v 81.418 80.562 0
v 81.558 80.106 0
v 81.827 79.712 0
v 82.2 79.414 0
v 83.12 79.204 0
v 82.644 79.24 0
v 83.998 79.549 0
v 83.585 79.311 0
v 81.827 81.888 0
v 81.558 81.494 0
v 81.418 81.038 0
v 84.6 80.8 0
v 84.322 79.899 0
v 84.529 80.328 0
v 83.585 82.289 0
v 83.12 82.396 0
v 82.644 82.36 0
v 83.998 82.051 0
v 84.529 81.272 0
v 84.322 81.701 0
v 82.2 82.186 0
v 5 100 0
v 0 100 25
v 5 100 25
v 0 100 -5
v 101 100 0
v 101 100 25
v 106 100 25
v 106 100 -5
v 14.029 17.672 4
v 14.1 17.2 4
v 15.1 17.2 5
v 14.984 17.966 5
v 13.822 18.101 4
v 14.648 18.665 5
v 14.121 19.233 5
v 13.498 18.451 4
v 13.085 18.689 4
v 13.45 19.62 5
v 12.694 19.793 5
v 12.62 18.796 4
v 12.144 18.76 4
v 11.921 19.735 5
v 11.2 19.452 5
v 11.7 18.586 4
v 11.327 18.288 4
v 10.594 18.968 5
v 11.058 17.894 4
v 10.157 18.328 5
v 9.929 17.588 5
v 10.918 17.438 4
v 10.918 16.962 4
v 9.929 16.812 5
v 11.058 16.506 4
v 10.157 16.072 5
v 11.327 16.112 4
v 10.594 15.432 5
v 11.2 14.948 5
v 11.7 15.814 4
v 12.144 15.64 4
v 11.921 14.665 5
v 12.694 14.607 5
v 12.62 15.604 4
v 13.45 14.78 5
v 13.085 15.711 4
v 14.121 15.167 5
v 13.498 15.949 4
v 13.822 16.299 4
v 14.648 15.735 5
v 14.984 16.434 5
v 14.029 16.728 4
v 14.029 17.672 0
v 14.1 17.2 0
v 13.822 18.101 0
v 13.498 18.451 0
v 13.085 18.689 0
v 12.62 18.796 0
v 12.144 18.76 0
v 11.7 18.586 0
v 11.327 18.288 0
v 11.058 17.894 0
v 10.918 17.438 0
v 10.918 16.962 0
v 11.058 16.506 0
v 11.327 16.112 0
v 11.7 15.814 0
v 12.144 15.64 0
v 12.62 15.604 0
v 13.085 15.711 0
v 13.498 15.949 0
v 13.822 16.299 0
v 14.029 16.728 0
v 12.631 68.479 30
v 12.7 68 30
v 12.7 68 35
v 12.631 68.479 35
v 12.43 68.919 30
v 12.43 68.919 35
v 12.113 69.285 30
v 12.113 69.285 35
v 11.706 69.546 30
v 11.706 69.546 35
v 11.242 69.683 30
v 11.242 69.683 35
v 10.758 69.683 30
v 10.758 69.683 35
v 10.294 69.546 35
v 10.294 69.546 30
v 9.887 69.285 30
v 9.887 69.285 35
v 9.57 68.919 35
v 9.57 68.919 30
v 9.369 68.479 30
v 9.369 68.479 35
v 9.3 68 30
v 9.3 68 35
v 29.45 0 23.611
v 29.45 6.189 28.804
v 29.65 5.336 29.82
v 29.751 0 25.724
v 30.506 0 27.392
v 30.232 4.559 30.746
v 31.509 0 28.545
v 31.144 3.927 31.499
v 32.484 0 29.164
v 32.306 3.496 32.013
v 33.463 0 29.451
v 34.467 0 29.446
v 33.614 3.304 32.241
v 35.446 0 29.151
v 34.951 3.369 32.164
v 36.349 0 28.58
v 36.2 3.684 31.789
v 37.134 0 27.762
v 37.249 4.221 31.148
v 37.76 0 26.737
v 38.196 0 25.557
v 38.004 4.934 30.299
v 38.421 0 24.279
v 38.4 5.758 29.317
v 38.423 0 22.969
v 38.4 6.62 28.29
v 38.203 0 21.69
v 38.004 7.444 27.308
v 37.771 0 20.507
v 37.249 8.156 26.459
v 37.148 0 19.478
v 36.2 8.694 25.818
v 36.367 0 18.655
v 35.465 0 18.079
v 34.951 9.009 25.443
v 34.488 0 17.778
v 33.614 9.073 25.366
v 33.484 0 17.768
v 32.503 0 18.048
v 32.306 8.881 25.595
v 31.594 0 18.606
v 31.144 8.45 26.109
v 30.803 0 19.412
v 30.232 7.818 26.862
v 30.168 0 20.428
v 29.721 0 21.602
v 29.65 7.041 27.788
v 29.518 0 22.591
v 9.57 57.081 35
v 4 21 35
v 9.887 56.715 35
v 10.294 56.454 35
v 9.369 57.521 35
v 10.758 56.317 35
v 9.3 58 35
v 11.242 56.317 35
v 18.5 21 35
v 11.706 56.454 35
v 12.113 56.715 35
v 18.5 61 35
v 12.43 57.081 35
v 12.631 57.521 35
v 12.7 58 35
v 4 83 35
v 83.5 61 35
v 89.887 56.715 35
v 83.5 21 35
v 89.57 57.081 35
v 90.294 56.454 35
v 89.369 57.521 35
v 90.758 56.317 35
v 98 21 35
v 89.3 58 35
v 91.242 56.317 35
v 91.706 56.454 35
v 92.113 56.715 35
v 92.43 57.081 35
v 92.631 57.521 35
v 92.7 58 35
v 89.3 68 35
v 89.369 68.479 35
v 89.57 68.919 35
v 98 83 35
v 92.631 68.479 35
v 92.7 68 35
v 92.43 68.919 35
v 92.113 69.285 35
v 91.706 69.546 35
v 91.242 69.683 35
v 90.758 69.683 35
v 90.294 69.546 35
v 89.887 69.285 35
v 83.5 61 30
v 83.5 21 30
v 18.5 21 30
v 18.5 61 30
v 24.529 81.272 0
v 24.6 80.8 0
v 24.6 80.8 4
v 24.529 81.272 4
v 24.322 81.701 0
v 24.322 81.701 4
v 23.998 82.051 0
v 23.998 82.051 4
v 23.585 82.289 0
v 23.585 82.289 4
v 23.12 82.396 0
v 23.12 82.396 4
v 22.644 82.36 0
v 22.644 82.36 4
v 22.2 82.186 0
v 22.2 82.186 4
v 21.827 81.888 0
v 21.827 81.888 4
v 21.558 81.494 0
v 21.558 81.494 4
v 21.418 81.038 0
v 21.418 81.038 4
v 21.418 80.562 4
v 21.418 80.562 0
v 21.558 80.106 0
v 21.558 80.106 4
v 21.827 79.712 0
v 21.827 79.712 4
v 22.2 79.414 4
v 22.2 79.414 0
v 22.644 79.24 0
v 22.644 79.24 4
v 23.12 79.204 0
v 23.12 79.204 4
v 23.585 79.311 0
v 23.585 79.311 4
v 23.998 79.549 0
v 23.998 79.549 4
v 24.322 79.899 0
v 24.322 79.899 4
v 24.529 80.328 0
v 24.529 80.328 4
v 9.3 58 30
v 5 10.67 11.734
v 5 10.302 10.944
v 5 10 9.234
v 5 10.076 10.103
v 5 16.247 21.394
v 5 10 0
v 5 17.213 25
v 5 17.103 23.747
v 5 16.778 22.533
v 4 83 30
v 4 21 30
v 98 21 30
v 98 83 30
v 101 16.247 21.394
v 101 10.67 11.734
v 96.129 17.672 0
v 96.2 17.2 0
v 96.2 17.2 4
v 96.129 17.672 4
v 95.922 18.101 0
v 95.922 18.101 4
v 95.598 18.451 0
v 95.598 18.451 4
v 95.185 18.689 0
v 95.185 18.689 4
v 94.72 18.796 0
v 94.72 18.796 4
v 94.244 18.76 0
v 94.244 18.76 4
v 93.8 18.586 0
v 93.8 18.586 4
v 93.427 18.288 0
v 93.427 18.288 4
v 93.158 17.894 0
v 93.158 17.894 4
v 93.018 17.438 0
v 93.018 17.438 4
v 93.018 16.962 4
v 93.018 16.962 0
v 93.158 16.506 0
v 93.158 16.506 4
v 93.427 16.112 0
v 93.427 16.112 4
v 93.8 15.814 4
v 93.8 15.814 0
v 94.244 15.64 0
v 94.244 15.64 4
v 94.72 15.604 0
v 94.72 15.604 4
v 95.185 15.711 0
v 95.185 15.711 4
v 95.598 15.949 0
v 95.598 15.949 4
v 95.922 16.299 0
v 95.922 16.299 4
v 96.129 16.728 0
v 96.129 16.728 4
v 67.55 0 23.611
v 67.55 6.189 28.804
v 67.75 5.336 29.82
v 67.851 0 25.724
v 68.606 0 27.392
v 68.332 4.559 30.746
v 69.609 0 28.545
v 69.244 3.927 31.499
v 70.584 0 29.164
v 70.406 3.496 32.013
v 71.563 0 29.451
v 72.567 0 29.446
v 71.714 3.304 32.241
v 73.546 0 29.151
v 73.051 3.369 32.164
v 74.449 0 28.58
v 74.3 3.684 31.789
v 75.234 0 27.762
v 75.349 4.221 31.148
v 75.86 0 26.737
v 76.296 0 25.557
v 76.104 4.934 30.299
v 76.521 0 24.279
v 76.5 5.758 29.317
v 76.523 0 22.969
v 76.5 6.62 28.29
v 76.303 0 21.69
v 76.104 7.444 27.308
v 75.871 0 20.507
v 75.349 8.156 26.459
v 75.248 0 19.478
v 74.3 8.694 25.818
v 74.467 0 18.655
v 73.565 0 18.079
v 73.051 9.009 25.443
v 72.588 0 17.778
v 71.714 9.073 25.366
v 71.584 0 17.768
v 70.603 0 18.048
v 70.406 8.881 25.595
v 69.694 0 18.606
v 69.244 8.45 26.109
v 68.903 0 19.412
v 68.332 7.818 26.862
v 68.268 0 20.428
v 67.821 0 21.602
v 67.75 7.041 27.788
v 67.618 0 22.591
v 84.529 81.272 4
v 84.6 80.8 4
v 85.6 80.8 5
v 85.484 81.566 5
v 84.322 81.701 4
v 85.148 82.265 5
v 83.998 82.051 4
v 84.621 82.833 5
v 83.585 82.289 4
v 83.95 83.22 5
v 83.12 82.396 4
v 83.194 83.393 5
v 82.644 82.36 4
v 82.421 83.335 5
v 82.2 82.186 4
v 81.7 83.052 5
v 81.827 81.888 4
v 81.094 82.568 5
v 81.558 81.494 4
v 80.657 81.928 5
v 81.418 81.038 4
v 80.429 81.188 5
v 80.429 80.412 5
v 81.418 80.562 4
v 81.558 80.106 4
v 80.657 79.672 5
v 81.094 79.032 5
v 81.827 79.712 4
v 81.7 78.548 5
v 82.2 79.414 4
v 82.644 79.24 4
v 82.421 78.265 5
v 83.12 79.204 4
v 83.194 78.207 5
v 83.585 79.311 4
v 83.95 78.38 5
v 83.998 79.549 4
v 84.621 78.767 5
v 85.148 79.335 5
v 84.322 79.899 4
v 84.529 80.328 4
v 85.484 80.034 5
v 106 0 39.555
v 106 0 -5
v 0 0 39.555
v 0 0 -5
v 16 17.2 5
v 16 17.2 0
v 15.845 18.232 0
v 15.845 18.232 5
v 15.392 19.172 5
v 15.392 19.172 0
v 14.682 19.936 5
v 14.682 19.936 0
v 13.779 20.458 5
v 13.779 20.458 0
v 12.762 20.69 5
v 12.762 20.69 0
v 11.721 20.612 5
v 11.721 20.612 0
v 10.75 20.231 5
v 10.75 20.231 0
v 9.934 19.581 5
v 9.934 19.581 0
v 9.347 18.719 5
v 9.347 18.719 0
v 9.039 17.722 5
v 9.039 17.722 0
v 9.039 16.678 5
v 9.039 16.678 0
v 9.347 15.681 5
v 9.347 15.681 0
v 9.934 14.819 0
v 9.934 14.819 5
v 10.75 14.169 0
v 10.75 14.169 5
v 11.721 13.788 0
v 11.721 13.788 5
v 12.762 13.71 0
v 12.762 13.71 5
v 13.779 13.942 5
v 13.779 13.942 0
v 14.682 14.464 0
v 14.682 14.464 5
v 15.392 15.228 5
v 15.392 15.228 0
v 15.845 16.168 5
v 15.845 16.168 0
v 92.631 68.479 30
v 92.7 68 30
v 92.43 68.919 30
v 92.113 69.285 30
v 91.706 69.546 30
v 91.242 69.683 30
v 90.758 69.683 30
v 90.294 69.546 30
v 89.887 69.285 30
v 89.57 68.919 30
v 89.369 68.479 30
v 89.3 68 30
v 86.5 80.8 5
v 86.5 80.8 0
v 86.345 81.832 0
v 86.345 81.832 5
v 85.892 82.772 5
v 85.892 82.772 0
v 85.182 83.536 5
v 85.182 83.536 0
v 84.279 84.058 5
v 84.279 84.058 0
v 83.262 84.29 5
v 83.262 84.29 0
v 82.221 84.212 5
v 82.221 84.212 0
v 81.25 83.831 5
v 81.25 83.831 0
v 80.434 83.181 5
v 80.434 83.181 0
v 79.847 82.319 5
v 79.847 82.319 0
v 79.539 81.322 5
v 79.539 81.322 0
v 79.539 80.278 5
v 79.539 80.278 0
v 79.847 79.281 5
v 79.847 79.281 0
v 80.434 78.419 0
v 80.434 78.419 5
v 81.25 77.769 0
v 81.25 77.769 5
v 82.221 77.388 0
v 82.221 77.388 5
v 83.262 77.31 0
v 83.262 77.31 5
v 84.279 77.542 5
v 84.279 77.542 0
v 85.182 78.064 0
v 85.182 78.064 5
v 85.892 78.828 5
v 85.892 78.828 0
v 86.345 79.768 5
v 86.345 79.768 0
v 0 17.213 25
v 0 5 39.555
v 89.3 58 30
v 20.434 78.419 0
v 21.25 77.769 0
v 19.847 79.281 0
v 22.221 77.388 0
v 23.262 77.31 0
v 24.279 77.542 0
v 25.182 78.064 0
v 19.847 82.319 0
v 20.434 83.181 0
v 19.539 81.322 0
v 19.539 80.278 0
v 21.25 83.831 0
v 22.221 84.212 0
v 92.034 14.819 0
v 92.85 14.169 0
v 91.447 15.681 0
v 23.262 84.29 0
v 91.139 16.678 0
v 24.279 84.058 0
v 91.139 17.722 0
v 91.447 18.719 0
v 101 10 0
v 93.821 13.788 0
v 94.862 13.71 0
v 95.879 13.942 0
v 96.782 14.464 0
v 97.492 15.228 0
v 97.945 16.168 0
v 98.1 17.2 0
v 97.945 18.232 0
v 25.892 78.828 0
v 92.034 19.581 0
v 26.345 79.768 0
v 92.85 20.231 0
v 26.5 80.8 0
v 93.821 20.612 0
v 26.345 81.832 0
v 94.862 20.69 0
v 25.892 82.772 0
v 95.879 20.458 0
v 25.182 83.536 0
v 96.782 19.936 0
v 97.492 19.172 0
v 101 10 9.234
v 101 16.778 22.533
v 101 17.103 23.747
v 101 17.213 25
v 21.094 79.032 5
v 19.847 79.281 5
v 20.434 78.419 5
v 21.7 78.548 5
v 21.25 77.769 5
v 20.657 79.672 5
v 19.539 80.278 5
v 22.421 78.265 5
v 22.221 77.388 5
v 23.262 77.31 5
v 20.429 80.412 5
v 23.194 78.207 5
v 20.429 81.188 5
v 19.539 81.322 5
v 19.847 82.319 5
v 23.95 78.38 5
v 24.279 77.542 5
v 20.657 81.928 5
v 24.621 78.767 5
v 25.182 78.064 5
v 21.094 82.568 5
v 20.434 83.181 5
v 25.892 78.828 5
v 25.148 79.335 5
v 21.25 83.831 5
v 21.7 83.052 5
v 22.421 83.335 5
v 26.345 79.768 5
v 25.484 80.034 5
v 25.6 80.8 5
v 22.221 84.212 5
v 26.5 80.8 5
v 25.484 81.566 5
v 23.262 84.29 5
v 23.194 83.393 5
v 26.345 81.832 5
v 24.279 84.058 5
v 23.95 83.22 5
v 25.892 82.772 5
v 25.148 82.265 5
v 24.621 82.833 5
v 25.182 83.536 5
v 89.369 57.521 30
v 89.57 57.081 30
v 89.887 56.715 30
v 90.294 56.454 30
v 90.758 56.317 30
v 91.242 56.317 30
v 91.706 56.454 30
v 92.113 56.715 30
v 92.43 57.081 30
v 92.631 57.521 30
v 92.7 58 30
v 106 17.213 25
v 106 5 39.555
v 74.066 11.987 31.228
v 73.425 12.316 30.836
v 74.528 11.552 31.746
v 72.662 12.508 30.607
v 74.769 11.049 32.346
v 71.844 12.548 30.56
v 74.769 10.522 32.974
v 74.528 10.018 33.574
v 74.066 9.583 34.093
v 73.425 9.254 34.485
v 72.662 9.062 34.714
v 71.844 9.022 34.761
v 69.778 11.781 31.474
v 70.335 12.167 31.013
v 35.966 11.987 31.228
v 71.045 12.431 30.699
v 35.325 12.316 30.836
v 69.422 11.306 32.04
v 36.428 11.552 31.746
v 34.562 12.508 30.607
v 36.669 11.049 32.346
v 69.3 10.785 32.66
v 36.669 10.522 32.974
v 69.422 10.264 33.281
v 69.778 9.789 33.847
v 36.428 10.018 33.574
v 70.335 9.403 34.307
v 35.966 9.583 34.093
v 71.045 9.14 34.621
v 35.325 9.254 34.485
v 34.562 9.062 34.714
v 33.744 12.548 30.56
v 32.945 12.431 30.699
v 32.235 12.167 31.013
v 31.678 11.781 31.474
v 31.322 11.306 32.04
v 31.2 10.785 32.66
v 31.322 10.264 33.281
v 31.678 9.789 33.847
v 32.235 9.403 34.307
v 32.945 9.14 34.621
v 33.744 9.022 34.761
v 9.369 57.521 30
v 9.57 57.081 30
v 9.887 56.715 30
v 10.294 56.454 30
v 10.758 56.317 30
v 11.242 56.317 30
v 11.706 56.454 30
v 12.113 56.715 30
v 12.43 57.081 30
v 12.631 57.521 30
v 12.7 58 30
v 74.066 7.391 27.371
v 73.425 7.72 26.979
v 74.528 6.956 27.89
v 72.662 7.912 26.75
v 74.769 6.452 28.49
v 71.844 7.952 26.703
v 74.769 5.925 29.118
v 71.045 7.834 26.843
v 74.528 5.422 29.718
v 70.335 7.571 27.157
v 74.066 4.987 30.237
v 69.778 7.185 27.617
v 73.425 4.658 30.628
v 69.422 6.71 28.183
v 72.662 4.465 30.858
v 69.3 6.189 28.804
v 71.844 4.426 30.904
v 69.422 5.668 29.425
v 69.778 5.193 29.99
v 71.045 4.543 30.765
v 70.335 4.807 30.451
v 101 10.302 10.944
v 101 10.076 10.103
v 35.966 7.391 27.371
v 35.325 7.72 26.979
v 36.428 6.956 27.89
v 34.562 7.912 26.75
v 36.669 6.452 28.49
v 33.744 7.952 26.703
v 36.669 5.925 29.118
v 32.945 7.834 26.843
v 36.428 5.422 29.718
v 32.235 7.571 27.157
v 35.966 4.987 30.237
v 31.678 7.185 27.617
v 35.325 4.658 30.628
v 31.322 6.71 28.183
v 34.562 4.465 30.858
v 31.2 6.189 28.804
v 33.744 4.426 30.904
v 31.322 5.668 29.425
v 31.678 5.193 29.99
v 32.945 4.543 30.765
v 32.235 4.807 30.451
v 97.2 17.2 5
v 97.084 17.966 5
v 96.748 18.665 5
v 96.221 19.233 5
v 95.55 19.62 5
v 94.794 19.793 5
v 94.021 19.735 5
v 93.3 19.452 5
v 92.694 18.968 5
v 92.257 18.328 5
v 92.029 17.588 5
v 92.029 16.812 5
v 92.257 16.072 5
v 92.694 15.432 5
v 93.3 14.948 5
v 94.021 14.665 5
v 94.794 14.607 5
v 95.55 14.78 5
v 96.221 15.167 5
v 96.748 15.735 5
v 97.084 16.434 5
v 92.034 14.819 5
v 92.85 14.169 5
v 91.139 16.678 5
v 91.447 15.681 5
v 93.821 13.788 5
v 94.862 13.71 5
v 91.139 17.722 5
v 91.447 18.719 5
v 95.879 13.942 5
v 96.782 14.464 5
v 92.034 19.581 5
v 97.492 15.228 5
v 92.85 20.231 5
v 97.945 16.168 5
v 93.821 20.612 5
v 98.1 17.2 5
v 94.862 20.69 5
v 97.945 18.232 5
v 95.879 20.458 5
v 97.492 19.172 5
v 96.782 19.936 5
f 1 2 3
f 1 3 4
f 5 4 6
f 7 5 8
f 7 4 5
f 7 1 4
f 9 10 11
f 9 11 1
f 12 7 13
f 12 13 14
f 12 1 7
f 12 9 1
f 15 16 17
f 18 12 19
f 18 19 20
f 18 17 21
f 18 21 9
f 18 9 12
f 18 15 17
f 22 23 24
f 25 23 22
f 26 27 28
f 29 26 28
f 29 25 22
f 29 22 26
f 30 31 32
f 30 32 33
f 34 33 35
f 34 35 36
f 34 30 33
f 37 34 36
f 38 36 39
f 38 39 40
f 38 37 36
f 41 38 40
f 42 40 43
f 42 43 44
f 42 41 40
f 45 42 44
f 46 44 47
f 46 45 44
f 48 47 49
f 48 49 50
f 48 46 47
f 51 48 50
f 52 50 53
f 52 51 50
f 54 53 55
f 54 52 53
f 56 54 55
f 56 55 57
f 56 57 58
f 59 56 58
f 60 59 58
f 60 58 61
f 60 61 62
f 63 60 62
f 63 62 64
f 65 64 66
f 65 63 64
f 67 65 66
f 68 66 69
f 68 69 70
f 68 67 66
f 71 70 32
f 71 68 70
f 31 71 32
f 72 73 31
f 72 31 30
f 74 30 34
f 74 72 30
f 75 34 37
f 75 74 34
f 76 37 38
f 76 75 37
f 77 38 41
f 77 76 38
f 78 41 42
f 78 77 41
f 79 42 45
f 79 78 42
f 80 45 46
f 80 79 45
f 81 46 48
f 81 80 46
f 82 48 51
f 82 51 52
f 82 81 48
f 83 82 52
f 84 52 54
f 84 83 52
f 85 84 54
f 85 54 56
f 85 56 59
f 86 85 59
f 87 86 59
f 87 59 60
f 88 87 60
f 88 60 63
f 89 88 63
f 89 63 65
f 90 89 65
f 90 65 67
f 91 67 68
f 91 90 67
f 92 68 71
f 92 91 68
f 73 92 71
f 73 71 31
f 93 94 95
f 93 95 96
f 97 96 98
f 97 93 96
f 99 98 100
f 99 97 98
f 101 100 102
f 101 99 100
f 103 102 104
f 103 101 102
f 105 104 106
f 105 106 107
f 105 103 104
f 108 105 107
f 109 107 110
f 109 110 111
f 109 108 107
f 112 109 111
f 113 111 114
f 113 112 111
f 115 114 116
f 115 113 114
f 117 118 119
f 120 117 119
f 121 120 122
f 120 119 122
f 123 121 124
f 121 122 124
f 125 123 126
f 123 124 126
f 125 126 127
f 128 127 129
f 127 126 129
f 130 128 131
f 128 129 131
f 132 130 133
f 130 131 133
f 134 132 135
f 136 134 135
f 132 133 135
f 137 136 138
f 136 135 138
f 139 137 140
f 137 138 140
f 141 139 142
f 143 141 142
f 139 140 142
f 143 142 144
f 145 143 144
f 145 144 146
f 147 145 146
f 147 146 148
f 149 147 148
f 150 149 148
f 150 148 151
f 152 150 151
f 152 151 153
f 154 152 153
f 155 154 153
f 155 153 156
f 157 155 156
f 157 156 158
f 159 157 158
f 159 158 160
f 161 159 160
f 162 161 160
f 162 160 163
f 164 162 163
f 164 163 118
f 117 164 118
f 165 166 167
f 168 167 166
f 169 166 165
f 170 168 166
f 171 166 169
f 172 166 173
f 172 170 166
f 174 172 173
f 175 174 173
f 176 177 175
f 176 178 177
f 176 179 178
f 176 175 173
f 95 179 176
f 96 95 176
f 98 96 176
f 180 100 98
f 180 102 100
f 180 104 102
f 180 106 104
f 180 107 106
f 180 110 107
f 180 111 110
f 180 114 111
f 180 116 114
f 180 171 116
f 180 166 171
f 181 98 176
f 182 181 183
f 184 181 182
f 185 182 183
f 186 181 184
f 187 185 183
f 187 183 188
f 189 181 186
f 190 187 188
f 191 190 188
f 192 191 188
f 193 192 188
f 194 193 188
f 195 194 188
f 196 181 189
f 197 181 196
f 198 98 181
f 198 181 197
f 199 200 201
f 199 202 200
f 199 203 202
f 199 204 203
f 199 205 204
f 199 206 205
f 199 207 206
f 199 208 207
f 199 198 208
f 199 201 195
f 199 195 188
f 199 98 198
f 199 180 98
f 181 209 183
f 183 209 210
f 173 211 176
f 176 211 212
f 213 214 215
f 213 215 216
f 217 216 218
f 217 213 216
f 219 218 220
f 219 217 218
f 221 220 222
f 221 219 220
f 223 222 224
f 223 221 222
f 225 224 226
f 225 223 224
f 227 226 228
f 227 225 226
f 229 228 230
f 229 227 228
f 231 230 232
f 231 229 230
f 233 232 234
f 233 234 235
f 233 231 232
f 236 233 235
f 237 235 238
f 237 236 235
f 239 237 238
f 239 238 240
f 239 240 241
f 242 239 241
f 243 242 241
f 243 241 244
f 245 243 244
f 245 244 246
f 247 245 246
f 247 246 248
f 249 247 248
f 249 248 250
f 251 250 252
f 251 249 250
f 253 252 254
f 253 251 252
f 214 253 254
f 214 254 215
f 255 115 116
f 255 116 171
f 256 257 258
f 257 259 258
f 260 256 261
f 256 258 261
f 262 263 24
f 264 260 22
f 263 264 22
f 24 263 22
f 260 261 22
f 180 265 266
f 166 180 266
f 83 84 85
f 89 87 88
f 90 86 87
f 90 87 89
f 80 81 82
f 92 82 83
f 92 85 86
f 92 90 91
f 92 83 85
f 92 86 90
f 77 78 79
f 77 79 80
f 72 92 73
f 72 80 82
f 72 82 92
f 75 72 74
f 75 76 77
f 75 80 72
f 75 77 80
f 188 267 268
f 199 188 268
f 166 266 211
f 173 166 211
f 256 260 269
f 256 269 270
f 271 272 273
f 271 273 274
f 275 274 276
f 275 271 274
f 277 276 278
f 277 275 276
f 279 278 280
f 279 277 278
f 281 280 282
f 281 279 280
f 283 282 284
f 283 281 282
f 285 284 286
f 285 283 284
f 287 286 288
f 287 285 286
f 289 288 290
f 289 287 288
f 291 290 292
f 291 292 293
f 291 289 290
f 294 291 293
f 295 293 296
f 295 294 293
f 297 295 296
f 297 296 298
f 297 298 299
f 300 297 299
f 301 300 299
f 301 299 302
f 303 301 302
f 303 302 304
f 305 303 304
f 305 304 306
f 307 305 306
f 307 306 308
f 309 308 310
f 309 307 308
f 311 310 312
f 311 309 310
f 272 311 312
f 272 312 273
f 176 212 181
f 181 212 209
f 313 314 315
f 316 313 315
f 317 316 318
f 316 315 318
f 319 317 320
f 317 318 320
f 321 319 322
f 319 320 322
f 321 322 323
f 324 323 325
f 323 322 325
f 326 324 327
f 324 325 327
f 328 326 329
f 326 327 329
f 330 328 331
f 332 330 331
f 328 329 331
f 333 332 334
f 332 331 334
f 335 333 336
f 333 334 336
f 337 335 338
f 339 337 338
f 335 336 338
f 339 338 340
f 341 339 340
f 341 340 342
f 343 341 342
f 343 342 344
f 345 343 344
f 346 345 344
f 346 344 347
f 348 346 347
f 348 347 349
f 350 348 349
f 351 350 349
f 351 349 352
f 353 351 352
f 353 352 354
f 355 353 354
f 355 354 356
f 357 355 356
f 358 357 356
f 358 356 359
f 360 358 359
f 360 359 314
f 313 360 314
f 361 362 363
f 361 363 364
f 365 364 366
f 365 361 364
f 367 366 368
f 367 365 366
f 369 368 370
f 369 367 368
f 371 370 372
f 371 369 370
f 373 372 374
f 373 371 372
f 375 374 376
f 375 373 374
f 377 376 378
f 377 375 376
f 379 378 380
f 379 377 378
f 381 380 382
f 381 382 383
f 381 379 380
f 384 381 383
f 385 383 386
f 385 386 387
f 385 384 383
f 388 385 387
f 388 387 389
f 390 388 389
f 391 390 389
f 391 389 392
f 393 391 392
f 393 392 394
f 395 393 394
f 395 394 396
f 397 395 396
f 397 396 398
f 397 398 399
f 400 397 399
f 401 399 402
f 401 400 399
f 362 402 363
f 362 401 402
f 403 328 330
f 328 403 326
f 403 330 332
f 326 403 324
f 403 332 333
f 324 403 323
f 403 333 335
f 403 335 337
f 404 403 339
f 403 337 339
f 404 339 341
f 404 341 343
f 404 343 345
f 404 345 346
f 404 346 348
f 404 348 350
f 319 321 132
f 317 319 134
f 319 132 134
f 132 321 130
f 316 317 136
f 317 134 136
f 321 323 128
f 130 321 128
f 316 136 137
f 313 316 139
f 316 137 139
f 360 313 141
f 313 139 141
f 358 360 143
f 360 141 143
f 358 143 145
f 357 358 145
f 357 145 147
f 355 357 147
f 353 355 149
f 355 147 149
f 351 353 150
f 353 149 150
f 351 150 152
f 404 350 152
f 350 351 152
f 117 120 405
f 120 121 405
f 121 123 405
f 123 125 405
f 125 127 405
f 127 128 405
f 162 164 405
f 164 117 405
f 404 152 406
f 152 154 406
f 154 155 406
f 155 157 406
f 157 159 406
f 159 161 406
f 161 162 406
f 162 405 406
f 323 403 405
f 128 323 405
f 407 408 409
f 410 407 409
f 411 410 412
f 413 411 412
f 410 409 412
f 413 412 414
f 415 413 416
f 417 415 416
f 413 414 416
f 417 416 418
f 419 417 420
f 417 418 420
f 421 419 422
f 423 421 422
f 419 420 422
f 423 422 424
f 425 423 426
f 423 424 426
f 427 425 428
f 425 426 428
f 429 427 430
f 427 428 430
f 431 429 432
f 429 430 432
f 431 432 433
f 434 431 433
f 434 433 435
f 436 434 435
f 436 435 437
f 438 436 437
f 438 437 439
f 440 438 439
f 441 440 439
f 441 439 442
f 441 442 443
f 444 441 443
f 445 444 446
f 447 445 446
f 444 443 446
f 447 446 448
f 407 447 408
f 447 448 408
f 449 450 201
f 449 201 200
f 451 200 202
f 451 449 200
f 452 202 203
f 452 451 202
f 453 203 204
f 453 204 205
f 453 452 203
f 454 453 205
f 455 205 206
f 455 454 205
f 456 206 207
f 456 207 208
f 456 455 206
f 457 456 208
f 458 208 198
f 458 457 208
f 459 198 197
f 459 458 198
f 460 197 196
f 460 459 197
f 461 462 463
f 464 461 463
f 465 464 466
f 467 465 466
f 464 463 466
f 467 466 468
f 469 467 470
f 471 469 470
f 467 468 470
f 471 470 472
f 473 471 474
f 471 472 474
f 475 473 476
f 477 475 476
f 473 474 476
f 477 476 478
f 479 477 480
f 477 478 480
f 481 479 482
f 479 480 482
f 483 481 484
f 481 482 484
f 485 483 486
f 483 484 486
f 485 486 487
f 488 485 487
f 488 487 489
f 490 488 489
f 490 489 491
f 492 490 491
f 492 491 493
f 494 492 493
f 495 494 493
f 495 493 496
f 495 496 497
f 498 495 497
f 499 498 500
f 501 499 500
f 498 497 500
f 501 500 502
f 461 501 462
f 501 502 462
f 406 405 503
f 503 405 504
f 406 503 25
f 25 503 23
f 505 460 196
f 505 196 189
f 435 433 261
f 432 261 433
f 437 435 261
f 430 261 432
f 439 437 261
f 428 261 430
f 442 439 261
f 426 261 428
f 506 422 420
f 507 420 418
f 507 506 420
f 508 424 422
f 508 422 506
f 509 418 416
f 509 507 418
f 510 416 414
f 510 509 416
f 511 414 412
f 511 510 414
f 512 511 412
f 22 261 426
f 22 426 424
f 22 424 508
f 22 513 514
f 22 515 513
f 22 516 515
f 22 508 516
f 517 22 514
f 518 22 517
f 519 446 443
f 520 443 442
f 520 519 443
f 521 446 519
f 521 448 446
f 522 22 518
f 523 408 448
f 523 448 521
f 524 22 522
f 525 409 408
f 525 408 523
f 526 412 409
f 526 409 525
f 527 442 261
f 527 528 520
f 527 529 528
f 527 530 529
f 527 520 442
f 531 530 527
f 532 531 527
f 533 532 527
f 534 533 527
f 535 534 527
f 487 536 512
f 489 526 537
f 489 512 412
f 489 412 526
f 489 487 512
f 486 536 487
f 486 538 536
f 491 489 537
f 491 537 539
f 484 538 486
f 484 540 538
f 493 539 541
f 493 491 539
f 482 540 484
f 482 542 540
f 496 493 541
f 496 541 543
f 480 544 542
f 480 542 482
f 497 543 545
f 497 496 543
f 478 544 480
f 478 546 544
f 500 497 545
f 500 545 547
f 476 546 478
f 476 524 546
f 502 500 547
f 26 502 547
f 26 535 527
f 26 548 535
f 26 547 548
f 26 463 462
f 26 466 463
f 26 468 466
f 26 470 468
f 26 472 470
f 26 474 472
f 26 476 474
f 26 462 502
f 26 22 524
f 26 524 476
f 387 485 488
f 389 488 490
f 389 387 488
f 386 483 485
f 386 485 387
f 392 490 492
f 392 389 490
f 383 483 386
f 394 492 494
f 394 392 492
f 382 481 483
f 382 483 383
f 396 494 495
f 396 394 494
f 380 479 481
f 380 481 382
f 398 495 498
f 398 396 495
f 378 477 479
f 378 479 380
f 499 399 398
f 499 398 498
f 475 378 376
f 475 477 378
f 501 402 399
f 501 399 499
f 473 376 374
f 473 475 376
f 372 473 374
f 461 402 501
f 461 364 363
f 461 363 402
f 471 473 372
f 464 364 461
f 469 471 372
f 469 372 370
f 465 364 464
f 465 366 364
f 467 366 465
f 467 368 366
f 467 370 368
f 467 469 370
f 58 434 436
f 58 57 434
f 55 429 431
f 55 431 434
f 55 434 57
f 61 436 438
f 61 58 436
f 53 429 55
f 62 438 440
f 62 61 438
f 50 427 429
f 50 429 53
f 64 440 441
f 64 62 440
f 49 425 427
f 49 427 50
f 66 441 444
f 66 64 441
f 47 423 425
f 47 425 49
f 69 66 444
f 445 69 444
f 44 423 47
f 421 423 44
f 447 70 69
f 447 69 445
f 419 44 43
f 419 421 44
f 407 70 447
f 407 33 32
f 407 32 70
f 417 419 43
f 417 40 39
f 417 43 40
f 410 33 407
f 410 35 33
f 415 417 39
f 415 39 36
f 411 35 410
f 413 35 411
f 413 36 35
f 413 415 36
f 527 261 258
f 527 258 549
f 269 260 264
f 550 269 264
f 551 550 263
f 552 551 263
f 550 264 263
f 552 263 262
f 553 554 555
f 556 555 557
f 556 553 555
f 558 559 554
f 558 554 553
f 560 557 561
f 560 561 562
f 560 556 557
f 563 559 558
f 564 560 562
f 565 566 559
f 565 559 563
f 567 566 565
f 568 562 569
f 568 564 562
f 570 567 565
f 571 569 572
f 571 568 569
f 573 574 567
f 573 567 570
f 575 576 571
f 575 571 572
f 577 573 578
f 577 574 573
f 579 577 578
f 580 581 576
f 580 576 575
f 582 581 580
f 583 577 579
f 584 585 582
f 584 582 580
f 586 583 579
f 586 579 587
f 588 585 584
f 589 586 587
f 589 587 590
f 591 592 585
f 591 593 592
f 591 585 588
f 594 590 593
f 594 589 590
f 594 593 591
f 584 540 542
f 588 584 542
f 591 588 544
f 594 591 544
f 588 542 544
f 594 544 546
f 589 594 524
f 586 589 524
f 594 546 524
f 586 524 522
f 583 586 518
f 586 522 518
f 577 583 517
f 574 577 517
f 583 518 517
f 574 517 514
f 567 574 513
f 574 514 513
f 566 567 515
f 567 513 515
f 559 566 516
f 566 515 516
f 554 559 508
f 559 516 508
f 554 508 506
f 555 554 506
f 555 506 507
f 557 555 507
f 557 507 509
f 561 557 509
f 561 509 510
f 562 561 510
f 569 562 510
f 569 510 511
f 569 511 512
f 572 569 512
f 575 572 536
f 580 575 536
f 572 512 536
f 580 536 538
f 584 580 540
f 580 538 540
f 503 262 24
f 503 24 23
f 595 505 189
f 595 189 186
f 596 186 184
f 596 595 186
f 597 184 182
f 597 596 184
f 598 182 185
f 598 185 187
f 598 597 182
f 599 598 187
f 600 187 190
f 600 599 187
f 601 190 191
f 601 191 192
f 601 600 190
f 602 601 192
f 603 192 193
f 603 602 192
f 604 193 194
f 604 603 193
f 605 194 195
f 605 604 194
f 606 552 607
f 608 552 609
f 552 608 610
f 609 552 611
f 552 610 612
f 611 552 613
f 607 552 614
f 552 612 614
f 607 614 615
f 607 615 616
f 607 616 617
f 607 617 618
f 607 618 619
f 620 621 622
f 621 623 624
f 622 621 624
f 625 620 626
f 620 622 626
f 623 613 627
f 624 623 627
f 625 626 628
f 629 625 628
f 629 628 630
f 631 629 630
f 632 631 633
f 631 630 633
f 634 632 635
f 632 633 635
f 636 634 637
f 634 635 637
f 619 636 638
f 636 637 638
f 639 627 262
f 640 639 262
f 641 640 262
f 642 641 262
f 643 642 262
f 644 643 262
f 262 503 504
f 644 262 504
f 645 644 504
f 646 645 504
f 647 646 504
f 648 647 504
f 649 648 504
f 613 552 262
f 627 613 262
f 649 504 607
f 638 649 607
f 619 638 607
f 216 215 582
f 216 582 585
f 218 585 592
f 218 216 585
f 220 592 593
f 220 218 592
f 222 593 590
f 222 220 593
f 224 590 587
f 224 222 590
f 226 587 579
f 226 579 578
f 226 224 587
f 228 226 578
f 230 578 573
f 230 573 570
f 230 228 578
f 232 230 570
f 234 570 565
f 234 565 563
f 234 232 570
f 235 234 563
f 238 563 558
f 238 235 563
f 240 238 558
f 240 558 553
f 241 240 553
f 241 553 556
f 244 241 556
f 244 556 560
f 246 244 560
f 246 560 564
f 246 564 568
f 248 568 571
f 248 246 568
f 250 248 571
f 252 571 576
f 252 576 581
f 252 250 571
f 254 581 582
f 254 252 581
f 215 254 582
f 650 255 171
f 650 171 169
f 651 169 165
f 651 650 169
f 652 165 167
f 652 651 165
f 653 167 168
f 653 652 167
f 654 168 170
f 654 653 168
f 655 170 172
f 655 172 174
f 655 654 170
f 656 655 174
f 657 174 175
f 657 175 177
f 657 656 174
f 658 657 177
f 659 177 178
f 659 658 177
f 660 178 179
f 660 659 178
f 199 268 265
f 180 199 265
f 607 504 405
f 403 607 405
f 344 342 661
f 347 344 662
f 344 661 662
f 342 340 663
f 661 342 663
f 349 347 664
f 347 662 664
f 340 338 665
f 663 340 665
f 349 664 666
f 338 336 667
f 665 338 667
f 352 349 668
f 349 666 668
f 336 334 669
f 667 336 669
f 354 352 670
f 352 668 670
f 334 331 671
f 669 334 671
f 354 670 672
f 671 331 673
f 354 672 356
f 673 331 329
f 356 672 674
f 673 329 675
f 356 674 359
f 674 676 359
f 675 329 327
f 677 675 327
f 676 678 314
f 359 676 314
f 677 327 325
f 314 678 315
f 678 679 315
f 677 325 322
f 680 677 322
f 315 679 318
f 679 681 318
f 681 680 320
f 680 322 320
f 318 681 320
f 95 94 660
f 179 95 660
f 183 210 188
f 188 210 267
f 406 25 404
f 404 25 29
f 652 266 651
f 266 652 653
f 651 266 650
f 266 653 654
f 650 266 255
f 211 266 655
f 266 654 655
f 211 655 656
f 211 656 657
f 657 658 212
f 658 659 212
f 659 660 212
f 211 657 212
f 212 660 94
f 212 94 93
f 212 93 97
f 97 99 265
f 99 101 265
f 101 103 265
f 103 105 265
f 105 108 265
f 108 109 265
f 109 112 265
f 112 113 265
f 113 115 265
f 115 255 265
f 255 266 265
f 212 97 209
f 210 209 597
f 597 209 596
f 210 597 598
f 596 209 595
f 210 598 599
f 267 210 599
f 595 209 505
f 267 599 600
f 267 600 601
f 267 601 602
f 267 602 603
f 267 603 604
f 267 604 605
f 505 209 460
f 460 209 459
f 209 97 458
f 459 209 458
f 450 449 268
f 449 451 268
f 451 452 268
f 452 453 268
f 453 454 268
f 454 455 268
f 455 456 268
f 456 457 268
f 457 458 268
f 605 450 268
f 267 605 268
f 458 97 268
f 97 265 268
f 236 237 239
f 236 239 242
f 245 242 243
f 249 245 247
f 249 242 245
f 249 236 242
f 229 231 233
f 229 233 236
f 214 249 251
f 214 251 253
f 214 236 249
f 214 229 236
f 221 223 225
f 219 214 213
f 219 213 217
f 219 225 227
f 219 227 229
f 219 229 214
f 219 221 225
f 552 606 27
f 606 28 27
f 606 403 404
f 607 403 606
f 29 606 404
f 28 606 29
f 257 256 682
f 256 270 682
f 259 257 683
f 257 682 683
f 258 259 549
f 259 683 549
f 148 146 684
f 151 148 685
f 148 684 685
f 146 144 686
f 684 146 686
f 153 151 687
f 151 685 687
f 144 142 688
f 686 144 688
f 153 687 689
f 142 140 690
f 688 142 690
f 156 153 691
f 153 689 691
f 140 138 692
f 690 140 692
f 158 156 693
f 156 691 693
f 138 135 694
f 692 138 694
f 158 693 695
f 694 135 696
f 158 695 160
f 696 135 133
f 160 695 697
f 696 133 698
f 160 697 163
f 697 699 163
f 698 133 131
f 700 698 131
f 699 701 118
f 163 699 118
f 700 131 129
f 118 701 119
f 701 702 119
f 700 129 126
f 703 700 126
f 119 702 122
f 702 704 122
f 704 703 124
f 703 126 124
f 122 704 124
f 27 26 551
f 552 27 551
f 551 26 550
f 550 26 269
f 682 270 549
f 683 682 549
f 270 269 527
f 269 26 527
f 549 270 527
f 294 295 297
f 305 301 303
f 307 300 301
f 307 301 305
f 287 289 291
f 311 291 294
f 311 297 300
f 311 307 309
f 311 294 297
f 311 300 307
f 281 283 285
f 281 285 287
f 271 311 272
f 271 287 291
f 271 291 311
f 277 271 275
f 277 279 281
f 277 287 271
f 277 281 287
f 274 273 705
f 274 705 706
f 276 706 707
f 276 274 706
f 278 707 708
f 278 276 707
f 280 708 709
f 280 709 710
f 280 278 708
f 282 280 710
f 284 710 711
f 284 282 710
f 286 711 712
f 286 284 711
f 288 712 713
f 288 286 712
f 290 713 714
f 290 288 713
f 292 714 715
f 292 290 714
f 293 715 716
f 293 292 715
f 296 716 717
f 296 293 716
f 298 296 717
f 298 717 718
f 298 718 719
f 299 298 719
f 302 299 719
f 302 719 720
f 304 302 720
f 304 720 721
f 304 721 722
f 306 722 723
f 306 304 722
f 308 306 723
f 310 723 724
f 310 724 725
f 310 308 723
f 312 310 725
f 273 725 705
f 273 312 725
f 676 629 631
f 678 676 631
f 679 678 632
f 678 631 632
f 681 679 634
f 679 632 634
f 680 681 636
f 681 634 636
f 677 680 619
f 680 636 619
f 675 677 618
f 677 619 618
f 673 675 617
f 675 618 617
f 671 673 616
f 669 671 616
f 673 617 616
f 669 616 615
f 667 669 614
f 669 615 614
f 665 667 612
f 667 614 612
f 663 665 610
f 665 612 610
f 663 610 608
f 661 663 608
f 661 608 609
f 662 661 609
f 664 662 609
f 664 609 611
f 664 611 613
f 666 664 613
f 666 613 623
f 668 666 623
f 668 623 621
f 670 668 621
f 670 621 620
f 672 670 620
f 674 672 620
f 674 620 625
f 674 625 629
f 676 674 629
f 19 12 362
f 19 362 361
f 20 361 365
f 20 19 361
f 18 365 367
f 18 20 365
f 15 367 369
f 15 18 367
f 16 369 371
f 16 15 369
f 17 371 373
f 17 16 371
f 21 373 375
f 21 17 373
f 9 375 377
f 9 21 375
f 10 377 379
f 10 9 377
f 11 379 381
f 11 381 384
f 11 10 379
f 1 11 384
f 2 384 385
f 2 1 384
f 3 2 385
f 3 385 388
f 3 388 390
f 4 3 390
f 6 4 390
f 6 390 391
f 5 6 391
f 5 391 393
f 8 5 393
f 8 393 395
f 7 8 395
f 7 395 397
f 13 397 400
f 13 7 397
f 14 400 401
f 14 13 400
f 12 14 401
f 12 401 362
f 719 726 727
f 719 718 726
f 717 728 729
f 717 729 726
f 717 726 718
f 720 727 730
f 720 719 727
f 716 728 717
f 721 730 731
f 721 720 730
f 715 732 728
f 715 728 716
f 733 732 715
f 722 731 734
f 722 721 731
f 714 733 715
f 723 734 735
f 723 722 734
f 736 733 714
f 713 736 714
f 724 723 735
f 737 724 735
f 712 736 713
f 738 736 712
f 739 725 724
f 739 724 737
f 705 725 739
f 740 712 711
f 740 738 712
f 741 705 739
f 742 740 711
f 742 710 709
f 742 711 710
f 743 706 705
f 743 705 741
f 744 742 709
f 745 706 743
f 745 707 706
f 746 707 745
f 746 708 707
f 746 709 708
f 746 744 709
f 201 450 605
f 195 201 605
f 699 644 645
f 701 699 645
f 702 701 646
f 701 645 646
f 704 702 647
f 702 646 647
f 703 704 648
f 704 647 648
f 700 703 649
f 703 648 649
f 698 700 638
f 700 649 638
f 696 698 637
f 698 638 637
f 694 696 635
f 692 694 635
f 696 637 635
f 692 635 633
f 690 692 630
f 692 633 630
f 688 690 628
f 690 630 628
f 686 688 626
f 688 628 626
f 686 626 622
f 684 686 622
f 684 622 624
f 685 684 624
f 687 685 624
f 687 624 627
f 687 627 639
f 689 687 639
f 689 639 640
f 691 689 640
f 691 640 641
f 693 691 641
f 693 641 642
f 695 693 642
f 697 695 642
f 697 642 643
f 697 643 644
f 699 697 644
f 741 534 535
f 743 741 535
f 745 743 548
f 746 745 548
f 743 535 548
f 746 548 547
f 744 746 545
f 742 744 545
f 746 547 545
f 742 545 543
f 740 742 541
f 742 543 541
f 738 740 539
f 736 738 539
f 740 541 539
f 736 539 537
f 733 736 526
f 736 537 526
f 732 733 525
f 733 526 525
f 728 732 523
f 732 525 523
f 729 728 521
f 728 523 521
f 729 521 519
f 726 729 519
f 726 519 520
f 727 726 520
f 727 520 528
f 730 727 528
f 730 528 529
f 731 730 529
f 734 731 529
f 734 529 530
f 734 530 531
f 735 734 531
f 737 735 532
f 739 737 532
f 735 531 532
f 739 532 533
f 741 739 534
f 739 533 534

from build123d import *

# Parameters (mm, degrees)
SKETCH_W        = 106
SKETCH_H        = 100
PAD_DEPTH       = 5
PAD001_DEPTH    = 25
SKETCH002_R     = 3.5
SKETCH002_R_2   = 1.6
PAD002_DEPTH    = 5
PAD004_DEPTH    = 106
PAD005_DEPTH    = 96
SKETCH006_R     = 2.75
POCKET_DEPTH    = 32.4705241598
SKETCH007_R     = 4.5
POCKET001_DEPTH = 26.4705241598
FILLET_R        = 5
CHAMFER_SIZE    = 1
PAD003_DEPTH    = 5


with BuildPart() as body:
    # Sketch → Pad (new body)
    with BuildSketch(Plane.XY):
        with Locations((53, 50)):
            Rectangle(SKETCH_W, SKETCH_H)
    extrude(amount=-PAD_DEPTH)

    # Sketch001 (on Face5 of Pad) → Pad001 (join)
    with BuildSketch(Plane.XY):
        Polygon((5, 95), (5, 10), (101, 10), (101, 95), (101, 100), (106, 100), (106, 0), (0, 0), (0, 100), (5, 100), align=None)
    extrude(amount=PAD001_DEPTH)

    # Sketch002 (on Face5 of Pad001) → Pad002 (join)
    with BuildSketch(Plane.XY):
        with Locations((83, 80.8)):
            Circle(SKETCH002_R)
        with Locations((83, 80.8)):
            Circle(SKETCH002_R_2, mode=Mode.SUBTRACT)
        with Locations((94.6, 17.2)):
            Circle(SKETCH002_R)
        with Locations((94.6, 17.2)):
            Circle(SKETCH002_R_2, mode=Mode.SUBTRACT)
        with Locations((12.5, 17.2)):
            Circle(SKETCH002_R)
        with Locations((12.5, 17.2)):
            Circle(SKETCH002_R_2, mode=Mode.SUBTRACT)
        with Locations((23, 80.8)):
            Circle(SKETCH002_R)
        with Locations((23, 80.8)):
            Circle(SKETCH002_R_2, mode=Mode.SUBTRACT)
    extrude(amount=PAD002_DEPTH)

    # Sketch004 (on Face5 of Pad002) → Pad004 (join)
    with BuildSketch(Plane(origin=(0, 0, 0), x_dir=(0, -1, 0), z_dir=(-1, 0, 0))):
        Polygon((-17.212964584, 25), (-5, 39.5548444193), (0, 39.5548444193), (0, 25), align=None)
    extrude(amount=-PAD004_DEPTH)

    # Sketch005 (on Face7 of Pad004) → Pad005 (join)
    with BuildSketch(Plane.YZ.offset(5)):
        with BuildLine():
            Line((10, 10.5740708319), (10, 25))
            Line((10, 25), (17.212964584, 25))
            ThreePointArc((16.2466105664, 21.393517708), (16.9671887758, 23.133147394), (17.212964584, 25))
            Line((16.2466105664, 21.393517708), (10, 10.5740708319))
        make_face()
    extrude(amount=PAD005_DEPTH)

    # Sketch006 (on Face5 of Pad005) → Pocket (cut, through all)
    with BuildSketch(Plane(origin=(0, 22.4110791708, 18.8051282665), x_dir=(-1, 0, 0), z_dir=(0, 0.7660444431, 0.6427876097))):
        with Locations((-72.05, 18.0868307174)):
            Circle(SKETCH006_R)
        with Locations((-33.95, 18.0868307174)):
            Circle(SKETCH006_R)
    extrude(amount=-POCKET_DEPTH, mode=Mode.SUBTRACT)

    # Sketch007 (on Face5 of Pocket) → Pocket001 (cut, through all)
    with BuildSketch(Plane(origin=(0, 17.8148125121, 14.9484026084), x_dir=(-1, 0, 0), z_dir=(0, 0.7660444431, 0.6427876097))):
        with Locations((-72.05, 18.0868307174)):
            Circle(SKETCH007_R)
        with Locations((-33.95, 18.0868307174)):
            Circle(SKETCH007_R)
    extrude(amount=-POCKET001_DEPTH, mode=Mode.SUBTRACT)

    # Fillet
    fillet_edges = [body.edges().sort_by_distance(p)[0] for p in [
        (53, 10, 10.574071),
    ]]
    fillet(fillet_edges, radius=FILLET_R)

    # Chamfer
    chamfer_edges = [body.edges().sort_by_distance(p)[0] for p in [
        (93, 17.2, 5),
        (10.9, 17.2, 5),
        (21.4, 80.8, 5),
        (81.4, 80.8, 5),
    ]]
    chamfer(chamfer_edges, length=CHAMFER_SIZE)


with BuildPart() as body001:
    # Sketch003 → Pad003 (new body)
    with BuildSketch(Plane.XY):
        Polygon((0, 0), (14.5, 0), (14.5, 40), (79.5, 40), (79.5, 0), (94, 0), (94, 62), (0, 62), align=None)
        with BuildLine():
            ThreePointArc((8.7, 47), (7, 48.7), (5.3, 47))
            Line((5.3, 47), (5.3, 37))
            ThreePointArc((5.3, 37), (7, 35.3), (8.7, 37))
            Line((8.7, 47), (8.7, 37))
        make_face(mode=Mode.SUBTRACT)
        with BuildLine():
            ThreePointArc((88.7, 47), (87, 48.7), (85.3, 47))
            Line((85.3, 47), (85.3, 37))
            ThreePointArc((85.3, 37), (87, 35.3), (88.7, 37))
            Line((88.7, 47), (88.7, 37))
        make_face(mode=Mode.SUBTRACT)
    extrude(amount=PAD003_DEPTH)


with BuildPart() as body001_1:
    # Body001 placement: moved
    add(body001.part.moved(Location((4, 21, 30))))


solid = Compound([body.part, body001_1.part])
